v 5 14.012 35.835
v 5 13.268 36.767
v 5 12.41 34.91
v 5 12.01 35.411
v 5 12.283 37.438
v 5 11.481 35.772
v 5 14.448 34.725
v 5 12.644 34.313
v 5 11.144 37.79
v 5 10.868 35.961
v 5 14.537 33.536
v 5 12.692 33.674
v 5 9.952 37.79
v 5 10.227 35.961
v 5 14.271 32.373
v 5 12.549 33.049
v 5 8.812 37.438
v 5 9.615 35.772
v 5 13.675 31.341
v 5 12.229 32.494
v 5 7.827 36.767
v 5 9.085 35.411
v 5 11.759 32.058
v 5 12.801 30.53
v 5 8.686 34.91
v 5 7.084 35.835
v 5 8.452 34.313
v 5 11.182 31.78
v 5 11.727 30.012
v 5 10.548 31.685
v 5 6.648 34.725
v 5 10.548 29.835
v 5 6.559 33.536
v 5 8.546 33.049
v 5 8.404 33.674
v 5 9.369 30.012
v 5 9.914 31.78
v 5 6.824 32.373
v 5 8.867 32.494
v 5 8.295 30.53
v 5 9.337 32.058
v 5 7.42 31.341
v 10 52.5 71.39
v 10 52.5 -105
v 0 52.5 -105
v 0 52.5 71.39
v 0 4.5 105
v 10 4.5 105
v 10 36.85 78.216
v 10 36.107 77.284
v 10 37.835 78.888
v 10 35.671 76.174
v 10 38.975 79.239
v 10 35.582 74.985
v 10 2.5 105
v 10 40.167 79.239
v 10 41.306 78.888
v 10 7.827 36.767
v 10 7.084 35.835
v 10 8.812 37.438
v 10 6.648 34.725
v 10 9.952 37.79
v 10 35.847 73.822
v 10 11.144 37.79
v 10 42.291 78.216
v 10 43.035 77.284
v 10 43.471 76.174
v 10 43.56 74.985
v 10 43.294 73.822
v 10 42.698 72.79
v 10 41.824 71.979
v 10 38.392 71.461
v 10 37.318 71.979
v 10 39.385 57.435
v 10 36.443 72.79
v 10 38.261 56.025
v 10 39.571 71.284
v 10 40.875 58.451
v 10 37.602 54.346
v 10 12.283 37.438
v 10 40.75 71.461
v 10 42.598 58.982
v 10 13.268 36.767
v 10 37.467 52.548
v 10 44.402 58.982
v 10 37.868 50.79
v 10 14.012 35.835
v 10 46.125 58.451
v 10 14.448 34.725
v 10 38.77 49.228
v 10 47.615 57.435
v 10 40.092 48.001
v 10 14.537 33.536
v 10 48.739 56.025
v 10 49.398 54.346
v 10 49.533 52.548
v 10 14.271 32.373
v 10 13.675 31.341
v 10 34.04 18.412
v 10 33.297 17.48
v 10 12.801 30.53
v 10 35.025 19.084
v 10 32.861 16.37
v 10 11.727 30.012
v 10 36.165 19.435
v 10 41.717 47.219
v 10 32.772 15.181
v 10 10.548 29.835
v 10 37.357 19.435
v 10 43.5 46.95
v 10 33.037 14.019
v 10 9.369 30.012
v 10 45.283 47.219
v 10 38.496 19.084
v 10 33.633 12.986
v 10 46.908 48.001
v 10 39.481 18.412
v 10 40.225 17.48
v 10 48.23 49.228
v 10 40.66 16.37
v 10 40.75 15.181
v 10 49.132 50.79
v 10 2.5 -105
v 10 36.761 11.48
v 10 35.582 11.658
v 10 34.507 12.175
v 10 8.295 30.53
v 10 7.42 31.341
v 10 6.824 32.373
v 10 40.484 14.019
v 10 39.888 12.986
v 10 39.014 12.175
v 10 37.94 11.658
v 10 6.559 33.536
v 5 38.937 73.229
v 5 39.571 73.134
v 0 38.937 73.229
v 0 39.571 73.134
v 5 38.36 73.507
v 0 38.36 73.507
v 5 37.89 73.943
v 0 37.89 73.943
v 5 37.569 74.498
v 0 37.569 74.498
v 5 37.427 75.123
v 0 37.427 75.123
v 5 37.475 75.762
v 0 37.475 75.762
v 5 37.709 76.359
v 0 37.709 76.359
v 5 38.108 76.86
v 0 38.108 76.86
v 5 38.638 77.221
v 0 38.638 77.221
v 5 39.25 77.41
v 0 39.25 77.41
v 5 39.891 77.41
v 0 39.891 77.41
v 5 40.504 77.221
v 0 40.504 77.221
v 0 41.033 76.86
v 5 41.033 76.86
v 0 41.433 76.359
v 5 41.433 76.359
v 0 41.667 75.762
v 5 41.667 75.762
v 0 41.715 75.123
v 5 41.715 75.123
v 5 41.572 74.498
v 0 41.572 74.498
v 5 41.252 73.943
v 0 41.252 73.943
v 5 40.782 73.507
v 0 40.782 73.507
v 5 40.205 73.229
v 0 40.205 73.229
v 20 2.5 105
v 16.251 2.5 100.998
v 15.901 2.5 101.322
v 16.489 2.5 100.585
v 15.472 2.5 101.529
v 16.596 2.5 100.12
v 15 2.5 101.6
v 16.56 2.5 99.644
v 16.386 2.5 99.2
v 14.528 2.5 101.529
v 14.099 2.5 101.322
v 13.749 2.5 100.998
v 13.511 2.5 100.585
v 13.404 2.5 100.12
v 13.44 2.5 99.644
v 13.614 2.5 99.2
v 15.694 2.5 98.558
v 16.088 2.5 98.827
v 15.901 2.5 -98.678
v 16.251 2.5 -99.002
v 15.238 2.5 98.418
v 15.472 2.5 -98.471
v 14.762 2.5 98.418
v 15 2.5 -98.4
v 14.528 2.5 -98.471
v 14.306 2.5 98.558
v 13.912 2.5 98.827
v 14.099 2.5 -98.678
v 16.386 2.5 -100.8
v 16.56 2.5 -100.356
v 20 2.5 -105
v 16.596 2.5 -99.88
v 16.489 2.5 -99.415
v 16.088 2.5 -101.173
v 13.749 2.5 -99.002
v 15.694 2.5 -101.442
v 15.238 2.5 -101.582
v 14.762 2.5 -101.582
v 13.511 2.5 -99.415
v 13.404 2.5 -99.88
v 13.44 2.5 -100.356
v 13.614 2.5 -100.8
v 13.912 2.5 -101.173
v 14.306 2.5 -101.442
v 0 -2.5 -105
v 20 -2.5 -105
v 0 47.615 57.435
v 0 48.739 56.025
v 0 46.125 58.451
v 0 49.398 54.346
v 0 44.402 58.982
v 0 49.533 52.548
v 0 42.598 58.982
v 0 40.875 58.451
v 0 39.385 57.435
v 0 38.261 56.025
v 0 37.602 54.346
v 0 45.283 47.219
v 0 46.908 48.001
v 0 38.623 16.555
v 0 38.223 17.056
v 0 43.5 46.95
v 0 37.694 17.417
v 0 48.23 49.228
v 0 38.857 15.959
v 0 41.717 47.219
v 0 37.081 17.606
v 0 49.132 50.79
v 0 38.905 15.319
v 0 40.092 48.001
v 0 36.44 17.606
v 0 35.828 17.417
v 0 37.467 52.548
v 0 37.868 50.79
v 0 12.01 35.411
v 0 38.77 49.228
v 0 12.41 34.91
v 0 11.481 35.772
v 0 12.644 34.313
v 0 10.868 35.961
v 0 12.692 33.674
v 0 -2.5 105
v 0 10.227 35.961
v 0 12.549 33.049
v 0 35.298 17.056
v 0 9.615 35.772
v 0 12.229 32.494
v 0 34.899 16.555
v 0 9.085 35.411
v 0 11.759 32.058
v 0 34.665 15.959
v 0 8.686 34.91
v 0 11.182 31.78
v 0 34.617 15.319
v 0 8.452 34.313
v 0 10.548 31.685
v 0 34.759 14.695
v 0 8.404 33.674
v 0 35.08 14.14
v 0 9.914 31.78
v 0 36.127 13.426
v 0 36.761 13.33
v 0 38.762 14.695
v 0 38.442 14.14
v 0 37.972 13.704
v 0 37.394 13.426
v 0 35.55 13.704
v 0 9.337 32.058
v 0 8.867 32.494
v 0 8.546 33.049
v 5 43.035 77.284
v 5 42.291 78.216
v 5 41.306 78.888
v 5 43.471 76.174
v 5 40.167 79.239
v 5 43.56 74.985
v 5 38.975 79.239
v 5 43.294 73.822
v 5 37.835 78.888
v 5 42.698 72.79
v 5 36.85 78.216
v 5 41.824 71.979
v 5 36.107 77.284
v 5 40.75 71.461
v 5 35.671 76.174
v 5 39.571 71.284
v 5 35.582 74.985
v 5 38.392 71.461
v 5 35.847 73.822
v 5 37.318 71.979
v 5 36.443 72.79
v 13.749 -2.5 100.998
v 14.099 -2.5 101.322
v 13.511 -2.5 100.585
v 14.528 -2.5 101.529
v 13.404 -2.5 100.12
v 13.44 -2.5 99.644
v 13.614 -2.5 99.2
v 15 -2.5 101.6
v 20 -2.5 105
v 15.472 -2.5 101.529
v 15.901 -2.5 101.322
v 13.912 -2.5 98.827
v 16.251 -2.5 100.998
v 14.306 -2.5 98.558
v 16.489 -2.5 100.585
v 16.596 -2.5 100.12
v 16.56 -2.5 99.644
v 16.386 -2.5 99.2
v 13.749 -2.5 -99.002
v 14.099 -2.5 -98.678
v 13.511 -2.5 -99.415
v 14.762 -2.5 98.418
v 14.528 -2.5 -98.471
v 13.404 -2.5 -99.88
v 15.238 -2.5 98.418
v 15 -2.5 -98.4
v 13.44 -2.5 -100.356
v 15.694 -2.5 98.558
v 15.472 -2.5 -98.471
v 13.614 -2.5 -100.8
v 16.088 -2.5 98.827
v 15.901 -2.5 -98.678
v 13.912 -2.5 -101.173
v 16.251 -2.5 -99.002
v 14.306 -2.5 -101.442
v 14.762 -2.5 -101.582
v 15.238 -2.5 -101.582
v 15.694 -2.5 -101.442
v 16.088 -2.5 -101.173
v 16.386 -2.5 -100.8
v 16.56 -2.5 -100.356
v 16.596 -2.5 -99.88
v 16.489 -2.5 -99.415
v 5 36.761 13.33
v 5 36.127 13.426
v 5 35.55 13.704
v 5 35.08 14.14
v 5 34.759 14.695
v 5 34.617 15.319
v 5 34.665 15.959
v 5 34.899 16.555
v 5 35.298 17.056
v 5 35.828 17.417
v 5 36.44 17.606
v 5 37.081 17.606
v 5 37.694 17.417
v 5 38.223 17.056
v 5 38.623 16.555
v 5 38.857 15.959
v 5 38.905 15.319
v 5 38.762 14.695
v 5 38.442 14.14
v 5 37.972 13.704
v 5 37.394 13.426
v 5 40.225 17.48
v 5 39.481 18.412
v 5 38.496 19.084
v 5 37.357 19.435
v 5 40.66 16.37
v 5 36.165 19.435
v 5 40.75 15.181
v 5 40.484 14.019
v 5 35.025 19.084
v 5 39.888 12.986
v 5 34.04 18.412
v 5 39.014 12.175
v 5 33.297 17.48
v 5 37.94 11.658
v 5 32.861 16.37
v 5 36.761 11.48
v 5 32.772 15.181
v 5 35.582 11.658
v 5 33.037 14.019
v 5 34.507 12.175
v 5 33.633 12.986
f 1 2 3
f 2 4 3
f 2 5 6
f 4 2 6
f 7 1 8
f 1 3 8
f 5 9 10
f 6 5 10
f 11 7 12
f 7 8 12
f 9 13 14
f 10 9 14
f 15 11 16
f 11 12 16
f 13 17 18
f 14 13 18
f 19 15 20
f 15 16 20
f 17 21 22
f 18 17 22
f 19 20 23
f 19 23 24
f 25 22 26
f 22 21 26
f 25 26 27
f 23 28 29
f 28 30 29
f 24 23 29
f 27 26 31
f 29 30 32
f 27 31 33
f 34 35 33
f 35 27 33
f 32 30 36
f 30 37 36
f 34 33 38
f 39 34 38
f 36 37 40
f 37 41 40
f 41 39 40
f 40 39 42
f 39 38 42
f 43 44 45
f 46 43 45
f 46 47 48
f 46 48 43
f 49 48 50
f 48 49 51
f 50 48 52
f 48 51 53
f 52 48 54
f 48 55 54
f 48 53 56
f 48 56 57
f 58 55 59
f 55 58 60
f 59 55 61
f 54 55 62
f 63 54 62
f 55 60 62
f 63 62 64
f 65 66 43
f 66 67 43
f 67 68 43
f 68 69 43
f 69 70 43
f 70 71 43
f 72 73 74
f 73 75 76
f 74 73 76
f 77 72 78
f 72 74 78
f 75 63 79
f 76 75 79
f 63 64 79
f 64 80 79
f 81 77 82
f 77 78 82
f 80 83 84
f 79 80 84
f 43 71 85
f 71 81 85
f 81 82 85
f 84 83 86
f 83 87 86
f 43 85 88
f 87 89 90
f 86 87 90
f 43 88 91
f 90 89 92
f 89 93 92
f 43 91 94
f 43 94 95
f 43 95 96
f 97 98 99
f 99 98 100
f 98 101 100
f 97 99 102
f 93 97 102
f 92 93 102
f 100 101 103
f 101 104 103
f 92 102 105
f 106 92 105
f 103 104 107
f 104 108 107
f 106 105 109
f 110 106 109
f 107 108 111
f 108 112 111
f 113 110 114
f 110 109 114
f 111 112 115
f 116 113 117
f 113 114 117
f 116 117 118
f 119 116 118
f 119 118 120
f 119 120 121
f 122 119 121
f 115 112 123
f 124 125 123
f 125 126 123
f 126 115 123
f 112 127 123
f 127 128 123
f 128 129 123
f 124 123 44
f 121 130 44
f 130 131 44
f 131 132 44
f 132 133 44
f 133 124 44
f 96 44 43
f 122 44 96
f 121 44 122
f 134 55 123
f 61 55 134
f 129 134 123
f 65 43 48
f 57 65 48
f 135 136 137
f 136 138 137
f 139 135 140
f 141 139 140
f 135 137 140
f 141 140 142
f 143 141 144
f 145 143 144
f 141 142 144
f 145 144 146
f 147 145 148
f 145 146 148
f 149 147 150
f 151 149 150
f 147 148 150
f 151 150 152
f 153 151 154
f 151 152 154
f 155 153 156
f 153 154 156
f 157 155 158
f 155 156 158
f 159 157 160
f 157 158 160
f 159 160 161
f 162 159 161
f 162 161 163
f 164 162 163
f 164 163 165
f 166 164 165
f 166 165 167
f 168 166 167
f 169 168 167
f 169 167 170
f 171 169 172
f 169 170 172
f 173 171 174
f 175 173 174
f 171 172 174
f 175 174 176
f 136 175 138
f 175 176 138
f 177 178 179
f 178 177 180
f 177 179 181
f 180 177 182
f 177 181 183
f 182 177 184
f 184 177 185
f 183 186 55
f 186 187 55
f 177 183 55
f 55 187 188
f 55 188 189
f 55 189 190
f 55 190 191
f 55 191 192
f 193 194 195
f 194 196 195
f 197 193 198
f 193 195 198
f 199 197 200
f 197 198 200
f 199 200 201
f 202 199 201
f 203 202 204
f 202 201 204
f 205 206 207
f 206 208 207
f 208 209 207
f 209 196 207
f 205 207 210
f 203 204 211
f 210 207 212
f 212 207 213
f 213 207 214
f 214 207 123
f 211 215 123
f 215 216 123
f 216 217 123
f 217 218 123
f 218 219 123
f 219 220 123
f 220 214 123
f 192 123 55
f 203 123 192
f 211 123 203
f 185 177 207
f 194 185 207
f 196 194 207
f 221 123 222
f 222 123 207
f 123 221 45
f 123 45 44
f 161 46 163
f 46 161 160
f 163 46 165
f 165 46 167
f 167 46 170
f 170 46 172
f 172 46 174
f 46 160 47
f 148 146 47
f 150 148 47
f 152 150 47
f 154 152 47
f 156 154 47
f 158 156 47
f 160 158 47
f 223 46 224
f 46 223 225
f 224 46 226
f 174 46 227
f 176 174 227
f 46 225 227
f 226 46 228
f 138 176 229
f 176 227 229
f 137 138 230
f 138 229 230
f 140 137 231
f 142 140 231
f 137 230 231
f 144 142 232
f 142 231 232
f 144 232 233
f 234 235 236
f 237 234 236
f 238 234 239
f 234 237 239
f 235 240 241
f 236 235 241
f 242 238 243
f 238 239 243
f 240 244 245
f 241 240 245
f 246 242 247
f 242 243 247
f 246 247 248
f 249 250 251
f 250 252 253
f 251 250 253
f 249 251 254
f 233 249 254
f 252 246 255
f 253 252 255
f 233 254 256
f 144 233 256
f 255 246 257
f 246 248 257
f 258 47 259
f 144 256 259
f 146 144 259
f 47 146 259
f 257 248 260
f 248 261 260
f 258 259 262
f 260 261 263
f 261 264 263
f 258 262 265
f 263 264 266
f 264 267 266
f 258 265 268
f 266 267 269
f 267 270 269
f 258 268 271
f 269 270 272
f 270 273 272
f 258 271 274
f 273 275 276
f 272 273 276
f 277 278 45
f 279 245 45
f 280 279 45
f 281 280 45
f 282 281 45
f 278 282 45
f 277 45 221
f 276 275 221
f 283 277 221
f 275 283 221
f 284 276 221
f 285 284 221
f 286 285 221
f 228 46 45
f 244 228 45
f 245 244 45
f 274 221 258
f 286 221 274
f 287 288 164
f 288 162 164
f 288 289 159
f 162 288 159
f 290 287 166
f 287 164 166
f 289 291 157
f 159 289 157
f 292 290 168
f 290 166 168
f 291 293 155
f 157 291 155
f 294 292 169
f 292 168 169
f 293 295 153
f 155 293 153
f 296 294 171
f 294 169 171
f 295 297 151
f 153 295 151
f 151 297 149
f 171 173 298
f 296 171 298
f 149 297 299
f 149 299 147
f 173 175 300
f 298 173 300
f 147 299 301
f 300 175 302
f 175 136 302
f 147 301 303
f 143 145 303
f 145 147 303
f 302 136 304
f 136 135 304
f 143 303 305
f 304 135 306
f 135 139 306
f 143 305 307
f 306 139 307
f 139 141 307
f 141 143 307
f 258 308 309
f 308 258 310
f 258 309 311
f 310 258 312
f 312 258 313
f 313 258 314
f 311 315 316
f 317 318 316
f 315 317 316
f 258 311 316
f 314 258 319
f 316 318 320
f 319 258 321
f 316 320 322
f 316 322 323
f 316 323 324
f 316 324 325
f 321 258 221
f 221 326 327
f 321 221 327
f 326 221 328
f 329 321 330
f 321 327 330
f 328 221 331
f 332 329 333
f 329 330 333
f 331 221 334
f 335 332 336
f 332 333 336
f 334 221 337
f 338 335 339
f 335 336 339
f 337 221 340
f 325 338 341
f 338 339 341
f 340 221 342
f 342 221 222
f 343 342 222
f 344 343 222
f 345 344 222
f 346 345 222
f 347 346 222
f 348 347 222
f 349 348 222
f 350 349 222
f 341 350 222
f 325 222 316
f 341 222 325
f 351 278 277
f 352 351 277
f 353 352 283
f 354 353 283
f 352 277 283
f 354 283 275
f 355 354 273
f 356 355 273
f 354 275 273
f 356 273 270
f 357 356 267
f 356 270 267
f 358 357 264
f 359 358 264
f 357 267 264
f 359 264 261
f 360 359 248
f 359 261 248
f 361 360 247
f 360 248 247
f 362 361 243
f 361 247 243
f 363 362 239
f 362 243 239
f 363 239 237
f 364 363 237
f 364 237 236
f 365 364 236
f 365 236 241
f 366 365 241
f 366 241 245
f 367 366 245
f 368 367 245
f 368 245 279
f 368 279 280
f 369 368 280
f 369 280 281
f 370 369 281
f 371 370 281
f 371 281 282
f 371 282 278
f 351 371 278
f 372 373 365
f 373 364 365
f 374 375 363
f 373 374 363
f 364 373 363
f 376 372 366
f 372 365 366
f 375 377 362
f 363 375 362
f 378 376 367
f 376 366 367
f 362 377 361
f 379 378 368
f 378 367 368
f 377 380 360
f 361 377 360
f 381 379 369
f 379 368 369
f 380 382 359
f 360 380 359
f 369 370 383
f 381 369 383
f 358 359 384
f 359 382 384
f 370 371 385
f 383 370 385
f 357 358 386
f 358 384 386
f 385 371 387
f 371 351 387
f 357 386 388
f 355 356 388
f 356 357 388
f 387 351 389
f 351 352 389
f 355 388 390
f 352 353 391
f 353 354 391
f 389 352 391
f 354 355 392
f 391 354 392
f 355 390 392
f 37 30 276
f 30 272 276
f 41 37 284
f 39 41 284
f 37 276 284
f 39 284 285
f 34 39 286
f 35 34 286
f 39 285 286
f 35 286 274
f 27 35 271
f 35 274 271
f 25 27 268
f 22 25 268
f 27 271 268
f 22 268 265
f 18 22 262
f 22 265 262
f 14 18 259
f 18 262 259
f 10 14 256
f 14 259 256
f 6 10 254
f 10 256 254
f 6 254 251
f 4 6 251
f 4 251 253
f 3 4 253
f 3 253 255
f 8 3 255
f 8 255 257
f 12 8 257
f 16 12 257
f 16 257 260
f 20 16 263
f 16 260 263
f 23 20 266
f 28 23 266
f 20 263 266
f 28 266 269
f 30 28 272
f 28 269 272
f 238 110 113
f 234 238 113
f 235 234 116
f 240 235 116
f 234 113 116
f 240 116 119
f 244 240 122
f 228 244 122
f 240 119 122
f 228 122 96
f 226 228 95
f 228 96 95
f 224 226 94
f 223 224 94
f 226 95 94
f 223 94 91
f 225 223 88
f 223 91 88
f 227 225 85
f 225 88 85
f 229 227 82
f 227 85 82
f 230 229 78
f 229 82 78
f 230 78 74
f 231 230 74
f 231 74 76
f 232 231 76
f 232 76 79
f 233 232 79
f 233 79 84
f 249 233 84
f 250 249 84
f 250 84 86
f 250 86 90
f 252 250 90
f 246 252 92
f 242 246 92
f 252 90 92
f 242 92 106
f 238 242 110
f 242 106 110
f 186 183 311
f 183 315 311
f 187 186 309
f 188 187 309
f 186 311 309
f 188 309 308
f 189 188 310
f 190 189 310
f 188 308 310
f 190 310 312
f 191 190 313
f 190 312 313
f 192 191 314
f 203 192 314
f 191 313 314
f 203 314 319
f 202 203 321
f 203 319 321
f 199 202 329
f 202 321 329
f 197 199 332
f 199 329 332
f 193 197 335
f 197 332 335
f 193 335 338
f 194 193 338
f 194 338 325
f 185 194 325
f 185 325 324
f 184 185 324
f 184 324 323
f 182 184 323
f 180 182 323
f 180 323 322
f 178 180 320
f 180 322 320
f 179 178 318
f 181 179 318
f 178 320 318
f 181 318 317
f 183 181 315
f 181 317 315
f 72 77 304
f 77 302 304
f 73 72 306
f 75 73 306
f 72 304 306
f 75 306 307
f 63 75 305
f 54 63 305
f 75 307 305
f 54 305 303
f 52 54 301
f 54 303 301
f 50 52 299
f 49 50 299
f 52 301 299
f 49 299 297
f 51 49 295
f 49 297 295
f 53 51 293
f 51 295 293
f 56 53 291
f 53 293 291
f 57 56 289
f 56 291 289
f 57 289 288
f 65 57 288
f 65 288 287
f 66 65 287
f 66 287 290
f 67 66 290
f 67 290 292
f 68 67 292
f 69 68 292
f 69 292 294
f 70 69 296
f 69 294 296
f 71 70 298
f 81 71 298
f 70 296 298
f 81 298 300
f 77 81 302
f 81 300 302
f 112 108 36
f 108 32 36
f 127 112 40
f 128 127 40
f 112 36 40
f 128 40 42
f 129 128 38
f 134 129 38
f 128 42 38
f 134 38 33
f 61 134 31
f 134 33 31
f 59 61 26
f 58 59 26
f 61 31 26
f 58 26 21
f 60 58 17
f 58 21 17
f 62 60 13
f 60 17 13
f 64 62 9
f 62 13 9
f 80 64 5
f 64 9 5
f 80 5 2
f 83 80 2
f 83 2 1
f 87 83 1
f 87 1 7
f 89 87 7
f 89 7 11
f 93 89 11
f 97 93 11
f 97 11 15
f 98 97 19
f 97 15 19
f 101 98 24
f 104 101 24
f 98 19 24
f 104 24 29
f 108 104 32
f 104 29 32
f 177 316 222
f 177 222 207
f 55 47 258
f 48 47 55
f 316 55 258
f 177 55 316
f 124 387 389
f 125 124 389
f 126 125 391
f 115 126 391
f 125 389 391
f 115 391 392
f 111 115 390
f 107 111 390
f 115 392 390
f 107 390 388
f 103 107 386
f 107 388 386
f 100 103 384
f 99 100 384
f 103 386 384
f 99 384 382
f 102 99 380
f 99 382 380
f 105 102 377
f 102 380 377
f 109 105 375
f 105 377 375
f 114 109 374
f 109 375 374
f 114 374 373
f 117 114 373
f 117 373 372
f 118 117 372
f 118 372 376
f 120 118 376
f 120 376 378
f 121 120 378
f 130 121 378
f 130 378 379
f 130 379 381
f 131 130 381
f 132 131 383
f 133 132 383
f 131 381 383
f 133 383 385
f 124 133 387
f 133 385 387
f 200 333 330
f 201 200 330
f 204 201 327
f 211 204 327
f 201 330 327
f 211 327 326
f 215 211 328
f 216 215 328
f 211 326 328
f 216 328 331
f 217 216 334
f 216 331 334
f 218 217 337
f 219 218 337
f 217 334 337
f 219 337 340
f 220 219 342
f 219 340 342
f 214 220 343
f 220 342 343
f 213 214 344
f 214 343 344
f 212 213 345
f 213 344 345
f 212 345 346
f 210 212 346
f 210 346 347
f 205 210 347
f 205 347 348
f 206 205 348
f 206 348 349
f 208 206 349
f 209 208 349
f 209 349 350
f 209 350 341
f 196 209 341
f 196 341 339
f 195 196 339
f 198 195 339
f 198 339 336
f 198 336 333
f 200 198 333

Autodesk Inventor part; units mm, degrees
ref_plane "YZ Plane" through (0, 0, 0) normal (1, 0, 0) x (0, 1, 0)
ref_plane "XZ Plane" through (0, 0, 0) normal (0, 1, 0) x (-1, 0, 0)
ref_plane "XY Plane" through (0, 0, 0) normal (0, 0, 1) x (1, 0, 0)
sketch "スケッチ1" plane through (0, 0, 0) normal (0, 0, 1) x (1, 0, 0)
  line L0 (-20, -2.5) -> (20, -2.5)
  line L1 (20, -2.5) -> (20, 2.5)
  line L2 (-20, 2.5) -> (-20, -2.5)
  line L3 (-20, -2.5) -> (20, 2.5) construction
  line L4 (20, -2.5) -> (-20, 2.5) construction
  line L5 (-10, 2.5) -> (10, 2.5)
  line L6 (10, 2.5) -> (10, 52.5)
  line L7 (10, 52.5) -> (-10, 52.5)
  line L8 (-10, 52.5) -> (-10, 2.5)
  line L9 (-10, 2.5) -> (10, 52.5) construction
  line L10 (10, 2.5) -> (-10, 52.5) construction
  line L11 (20, 2.5) -> (10, 2.5)
  line L12 (-10, 2.5) -> (-20, 2.5)
  line L13 (0, 52.5) -> (0, -2.5)
  point P0 (0, 0)
  point P1 (0, 27.5)
  point P2 (0, 27.5)
  point P3 (0, 0)
  dimension "d0" = 20
  dimension "d1" = 50
  dimension "d2" = 5
  dimension "d3" = 10
extrude "押し出し1" add sketch "スケッチ1" along normal mid plane 210 contours L13 L5 L11 L1 L0 | L13 L7 L6 L5
sketch "スケッチ4" plane through (0, -2.5, 105) normal (-1, 0, 0) x (0, 0, 1)
  line L0 (0, 7) -> (-33.61, 55)
  line L1 (-210, 55) -> (0, 55) projected
  line L2 (0, 55) -> (0, 0) projected
  line L3 (0, 5) -> (-210, 5) projected
  point P0 (-105, 2.5)
  dimension "d18" = 35
  dimension "d21" = 2
extrude "押し出し3" cut sketch "スケッチ4" against normal through all
sketch "スケッチ5" plane through (10, 2.5, -105) normal (1, 0, 0) x (0, 0, -1)
  circle A0 centre (-158, 41) radius 6.05
  line L0 (0, 0) -> (-210, 0) projected
  line L1 (-210, 0) -> (-210, 2) projected
  point P0 (-105, -2.5)
  dimension "d22" = 12.1
  dimension "d23" = 41
  dimension "d37" = 52
extrude "押し出し4" cut sketch "スケッチ5" against normal blind 10
sketch "スケッチ6" plane through (10, 2.5, 105) normal (0, 1, 0) x (1, 0, 0)
  line L0 (10, 210) -> (10, 0) projected
  line L1 (10, 0) -> (0, 0) projected
  line L2 (0, 210) -> (10, 210) projected
  point P0 (-10, 105)
  point P1 (5, 205)
  point P2 (5, 5)
  dimension "d27" = 5
  dimension "d28" = 5
  dimension "d29" = 5
hole "穴2" at (15, 2.5, -100) at (15, 2.5, 100) direction (0, -1, 0) diameter 3.2 end through all clearance for "Socket Head Cap Screw" size "M3" standard "Ansi Metric M Profile"
sketch "スケッチ7" plane through (10, -2.5, -105) normal (-1, 0, 0) x (0, 0, 1)
  line L0 (120.4801, 39.2607) -> (161.9292, 68.2837)
  line L1 (161.9292, 68.2837) -> (180.2837, 42.0708)
  line L2 (180.2837, 42.0708) -> (138.8346, 13.0478)
  line L3 (138.8346, 13.0478) -> (120.4801, 39.2607)
  line L4 (120.4801, 39.2607) -> (180.2837, 42.0708) construction
  line L5 (161.9292, 68.2837) -> (138.8346, 13.0478) construction
  circle A0 centre (158, 46) radius 6.05 projected
  line L6 (0, 0) -> (210, 0) projected
  point P0 (105, 2.5)
  dimension "d38" = 32
  dimension "d39" = 50.6
  dimension "d40" = 16
  dimension "d41" = 16
  dimension "d42" = 35
hole "穴3" at (10, 10.5478, 33.8346) at (10, 36.7607, 15.4801) at (10, 39.5708, 75.2837) direction (-1, 0, 0) diameter 4.3 end through all counterbore diameter 8 counterbore depth 5 clearance for "Socket Head Cap Screw" size "M4" standard "Ansi Metric M Profile"
equation "\"d40\" = 0.5 * d38"
properties part number "s_base4"
